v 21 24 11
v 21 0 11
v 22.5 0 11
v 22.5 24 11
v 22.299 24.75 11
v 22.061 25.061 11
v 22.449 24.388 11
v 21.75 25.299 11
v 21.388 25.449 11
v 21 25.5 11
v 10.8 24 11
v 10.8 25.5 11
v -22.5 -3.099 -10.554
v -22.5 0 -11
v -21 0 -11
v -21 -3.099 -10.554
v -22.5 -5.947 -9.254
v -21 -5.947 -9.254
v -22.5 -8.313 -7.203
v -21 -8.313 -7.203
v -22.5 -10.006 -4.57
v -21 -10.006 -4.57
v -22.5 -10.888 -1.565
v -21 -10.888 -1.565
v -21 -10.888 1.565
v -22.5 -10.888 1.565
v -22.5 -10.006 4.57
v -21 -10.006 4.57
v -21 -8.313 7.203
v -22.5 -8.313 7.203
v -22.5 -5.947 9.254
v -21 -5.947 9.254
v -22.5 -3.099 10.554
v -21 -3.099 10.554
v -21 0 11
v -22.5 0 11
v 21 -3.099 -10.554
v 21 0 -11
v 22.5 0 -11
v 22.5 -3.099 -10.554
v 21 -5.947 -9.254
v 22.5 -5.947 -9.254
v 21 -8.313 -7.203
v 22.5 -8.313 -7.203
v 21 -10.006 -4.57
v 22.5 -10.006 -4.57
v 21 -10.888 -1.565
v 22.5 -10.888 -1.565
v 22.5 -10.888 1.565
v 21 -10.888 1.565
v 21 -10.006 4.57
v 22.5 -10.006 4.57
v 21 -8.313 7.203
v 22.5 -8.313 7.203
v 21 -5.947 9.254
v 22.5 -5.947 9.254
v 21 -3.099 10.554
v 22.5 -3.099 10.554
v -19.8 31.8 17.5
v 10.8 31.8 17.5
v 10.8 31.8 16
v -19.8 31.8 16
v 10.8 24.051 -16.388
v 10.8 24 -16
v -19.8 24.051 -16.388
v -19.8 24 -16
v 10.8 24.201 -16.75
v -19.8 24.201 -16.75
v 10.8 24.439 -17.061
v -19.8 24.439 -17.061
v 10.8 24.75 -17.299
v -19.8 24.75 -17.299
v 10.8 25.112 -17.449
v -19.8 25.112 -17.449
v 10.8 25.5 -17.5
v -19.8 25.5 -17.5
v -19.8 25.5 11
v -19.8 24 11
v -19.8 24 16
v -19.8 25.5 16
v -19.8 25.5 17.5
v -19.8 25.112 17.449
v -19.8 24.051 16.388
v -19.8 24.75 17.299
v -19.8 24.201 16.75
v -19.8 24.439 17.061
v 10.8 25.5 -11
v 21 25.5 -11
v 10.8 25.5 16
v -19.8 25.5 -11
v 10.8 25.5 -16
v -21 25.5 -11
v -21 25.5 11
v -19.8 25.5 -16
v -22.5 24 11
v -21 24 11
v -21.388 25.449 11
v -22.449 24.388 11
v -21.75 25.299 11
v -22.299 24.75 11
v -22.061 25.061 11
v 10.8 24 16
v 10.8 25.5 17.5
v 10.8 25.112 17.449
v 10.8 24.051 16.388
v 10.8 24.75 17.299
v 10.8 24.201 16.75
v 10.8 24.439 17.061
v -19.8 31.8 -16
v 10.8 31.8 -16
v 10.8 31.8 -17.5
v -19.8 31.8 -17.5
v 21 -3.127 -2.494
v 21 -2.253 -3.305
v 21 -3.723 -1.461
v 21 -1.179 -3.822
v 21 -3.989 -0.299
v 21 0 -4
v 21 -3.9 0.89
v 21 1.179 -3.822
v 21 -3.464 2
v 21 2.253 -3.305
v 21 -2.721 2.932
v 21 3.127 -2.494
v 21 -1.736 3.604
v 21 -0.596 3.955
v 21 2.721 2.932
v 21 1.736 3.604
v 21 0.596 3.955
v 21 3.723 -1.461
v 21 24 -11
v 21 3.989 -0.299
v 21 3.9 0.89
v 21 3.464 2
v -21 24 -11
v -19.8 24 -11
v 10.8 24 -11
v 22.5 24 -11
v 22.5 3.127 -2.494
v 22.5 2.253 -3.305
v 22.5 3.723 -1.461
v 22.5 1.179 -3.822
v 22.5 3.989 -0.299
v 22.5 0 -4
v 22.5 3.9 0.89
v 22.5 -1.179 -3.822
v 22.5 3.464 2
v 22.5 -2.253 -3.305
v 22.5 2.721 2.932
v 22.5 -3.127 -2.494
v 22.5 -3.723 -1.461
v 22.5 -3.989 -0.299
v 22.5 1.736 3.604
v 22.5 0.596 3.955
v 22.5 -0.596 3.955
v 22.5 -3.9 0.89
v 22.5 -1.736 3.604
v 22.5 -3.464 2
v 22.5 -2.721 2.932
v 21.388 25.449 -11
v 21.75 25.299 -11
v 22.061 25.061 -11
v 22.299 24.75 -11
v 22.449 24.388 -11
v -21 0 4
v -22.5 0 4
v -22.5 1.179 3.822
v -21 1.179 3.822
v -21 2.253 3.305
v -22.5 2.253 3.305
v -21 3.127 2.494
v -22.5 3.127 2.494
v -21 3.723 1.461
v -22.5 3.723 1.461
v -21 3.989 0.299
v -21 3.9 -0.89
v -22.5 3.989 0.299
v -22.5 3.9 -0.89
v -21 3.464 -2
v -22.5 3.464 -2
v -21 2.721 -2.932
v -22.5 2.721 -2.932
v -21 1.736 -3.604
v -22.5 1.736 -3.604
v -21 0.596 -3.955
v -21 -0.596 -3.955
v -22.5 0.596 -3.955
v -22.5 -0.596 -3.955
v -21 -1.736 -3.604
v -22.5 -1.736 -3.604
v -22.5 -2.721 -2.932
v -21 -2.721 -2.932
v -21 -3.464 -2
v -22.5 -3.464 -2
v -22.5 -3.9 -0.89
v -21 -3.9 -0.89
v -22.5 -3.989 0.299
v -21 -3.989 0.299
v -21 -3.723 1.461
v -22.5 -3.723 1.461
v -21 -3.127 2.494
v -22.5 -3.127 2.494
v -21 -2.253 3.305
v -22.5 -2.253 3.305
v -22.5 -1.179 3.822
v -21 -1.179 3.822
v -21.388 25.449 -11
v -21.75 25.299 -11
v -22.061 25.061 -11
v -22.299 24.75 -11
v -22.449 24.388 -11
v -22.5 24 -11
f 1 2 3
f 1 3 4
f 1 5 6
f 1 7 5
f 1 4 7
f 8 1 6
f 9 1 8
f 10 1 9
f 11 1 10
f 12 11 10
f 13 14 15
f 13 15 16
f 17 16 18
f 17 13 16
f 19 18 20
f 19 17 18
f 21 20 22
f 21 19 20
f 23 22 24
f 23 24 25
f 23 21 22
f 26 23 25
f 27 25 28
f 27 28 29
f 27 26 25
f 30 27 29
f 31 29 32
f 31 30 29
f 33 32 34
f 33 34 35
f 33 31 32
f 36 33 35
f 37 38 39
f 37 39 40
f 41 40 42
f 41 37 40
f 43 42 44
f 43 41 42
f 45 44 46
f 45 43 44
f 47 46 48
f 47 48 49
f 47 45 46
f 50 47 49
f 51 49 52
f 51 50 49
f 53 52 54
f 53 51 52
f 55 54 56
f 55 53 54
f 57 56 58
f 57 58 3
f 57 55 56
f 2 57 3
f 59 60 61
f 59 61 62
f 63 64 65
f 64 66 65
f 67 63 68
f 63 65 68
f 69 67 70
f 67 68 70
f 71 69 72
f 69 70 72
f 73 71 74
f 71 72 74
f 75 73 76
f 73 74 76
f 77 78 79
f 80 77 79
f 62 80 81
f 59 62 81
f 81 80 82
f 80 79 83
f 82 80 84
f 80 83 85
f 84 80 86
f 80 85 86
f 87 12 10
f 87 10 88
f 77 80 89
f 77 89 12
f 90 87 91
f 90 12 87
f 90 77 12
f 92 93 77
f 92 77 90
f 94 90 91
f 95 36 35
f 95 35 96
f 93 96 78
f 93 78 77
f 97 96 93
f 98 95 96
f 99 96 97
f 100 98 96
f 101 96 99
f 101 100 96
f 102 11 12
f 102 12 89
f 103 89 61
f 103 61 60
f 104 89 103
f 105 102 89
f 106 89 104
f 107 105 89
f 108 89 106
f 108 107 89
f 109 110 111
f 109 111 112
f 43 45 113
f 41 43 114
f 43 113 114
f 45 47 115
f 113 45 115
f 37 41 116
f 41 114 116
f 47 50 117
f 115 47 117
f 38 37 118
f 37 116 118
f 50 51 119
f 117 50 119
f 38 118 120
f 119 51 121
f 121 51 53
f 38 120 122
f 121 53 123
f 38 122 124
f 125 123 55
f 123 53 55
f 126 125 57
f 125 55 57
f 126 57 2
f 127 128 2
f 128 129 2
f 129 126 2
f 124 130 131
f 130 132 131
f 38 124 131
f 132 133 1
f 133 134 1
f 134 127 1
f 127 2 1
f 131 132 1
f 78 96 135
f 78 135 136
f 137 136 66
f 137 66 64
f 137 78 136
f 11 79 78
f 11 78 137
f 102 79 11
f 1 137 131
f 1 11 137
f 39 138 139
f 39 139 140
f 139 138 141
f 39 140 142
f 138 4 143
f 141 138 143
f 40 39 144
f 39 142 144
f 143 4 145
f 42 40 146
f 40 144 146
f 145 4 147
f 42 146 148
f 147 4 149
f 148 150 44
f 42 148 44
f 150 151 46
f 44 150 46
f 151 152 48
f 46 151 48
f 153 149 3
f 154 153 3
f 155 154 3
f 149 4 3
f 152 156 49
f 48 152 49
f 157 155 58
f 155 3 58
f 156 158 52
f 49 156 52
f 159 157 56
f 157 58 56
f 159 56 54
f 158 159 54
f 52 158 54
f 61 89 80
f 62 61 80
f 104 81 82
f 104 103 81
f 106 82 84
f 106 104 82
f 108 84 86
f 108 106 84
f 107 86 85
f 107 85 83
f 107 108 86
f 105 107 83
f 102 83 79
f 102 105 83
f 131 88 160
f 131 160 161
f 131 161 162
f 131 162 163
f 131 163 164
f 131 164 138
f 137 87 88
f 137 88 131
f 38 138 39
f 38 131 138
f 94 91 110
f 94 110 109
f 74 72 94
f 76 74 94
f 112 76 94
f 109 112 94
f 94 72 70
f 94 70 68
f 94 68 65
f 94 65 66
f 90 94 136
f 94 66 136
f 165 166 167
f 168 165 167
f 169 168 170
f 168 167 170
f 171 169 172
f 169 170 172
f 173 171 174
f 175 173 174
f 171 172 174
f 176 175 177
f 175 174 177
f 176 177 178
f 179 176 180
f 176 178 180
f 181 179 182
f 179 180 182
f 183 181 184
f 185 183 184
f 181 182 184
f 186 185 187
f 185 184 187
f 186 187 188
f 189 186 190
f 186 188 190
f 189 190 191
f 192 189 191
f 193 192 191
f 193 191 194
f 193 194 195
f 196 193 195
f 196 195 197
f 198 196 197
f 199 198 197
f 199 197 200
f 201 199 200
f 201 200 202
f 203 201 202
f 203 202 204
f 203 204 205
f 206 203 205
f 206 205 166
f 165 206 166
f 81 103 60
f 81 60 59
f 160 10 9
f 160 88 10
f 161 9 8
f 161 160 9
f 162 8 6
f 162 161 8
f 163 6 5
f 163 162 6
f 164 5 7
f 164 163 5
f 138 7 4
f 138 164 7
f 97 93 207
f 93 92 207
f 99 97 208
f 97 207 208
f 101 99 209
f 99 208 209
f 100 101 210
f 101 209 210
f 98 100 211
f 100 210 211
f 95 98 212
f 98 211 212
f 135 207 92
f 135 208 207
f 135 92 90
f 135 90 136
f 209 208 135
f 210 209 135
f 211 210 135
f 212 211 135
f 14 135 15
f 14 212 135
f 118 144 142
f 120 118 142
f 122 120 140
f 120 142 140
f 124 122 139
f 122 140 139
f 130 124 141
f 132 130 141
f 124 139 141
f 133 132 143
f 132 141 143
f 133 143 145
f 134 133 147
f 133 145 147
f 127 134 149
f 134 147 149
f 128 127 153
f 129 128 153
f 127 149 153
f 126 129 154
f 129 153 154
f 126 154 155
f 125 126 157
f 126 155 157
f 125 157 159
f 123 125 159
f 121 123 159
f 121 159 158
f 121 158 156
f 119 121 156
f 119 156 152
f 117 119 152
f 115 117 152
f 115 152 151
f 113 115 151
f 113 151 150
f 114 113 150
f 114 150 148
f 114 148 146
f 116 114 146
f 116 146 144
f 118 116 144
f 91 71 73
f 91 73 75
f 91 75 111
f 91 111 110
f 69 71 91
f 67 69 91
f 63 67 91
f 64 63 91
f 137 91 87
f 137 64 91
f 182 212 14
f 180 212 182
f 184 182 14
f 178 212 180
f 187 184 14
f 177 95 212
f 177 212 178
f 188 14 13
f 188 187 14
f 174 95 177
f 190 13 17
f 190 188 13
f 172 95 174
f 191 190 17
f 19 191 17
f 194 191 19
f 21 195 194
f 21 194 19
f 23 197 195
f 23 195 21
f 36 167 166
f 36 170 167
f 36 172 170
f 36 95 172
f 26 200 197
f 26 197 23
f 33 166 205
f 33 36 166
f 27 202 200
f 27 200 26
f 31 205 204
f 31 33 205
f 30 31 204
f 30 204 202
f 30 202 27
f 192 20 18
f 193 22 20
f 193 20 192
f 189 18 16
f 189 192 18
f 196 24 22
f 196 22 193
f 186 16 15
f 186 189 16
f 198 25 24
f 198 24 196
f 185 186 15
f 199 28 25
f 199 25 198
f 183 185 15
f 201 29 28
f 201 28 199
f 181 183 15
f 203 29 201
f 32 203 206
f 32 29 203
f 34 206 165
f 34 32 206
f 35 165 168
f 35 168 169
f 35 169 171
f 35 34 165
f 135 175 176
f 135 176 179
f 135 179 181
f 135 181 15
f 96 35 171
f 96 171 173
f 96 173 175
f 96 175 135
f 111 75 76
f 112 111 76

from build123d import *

# Parameters (mm, degrees)
BOSS_EXTRUDE1_DEPTH          = 45
SKETCH2_W                    = 42
SKETCH2_H                    = 41.882656114
CUT_EXTRUDE1_DEPTH           = 23
SKETCH3_W                    = 30.6
SKETCH3_H                    = 1.5
BOSS_EXTRUDE2_DEPTH          = 6.5
SKETCH4_W                    = 30.6
SKETCH4_H                    = 1.5
BOSS_EXTRUDE3_DEPTH          = 6.3
SKETCH5_W                    = 30.6
SKETCH5_H                    = 1.5
BOSS_EXTRUDE4_DEPTH          = 6.5
SKETCH6_W                    = 30.6
SKETCH6_H                    = 1.5
BOSS_EXTRUDE5_DEPTH          = 6.3
F_8_0_8_DIAMETER_HOLE1_D     = 8
F_8_0_8_DIAMETER_HOLE1_DEPTH = 1.5
F_8_0_8_DIAMETER_HOLE2_D     = 8
F_8_0_8_DIAMETER_HOLE2_DEPTH = 1.5
FILLET1_R                    = 1.5


with BuildPart() as part:
    # Sketch1 → Boss-Extrude1 (new body)
    with BuildSketch(Plane(origin=(-22.5, 0, 0), x_dir=(0, -1, 0), z_dir=(-1, 0, 0))):
        with BuildLine():
            Line((-25.5, -11), (0, -11))
            ThreePointArc((0, -11), (11, 0), (0, 11))
            Line((0, 11), (-25.5, 11))
            Line((-25.5, 11), (-25.5, -11))
        make_face()
    extrude(amount=-BOSS_EXTRUDE1_DEPTH)

    # Sketch2 → Cut-Extrude1 (cut, through all)
    with BuildSketch(Plane.XY.offset(11)):
        with Locations((0, 3.058671943)):
            Rectangle(SKETCH2_W, SKETCH2_H)
    extrude(amount=-CUT_EXTRUDE1_DEPTH, mode=Mode.SUBTRACT)

    # Sketch3 → Boss-Extrude2 (add)
    with BuildSketch(Plane(origin=(0, 0, -11), x_dir=(-1, 0, 0), z_dir=(0, 0, -1))):
        with Locations((4.5, 24.75)):
            Rectangle(SKETCH3_W, SKETCH3_H)
    extrude(amount=BOSS_EXTRUDE2_DEPTH)

    # Sketch4 → Boss-Extrude3 (add)
    with BuildSketch(Plane(origin=(0, 25.5, 0), x_dir=(-1, 0, 0), z_dir=(0, 1, 0))):
        with Locations((4.5, -16.75)):
            Rectangle(SKETCH4_W, SKETCH4_H)
    extrude(amount=BOSS_EXTRUDE3_DEPTH)

    # Sketch5 → Boss-Extrude4 (add)
    with BuildSketch(Plane.XY.offset(11)):
        with Locations((-4.5, 24.75)):
            Rectangle(SKETCH5_W, SKETCH5_H)
    extrude(amount=BOSS_EXTRUDE4_DEPTH)

    # Sketch6 → Boss-Extrude5 (add)
    with BuildSketch(Plane(origin=(0, 25.5, 0), x_dir=(-1, 0, 0), z_dir=(0, 1, 0))):
        with Locations((4.5, 16.75)):
            Rectangle(SKETCH6_W, SKETCH6_H)
    extrude(amount=BOSS_EXTRUDE5_DEPTH)

    # Ø8.0 (8) Diameter Hole1
    with Locations(Plane.ZY.offset(-21)):
        with Locations((0, 0)):
            Hole(F_8_0_8_DIAMETER_HOLE1_D / 2, depth=F_8_0_8_DIAMETER_HOLE1_DEPTH)

    # Ø8.0 (8) Diameter Hole2
    with Locations(Plane(origin=(-21, 0, 0), x_dir=(0, 0, -1), z_dir=(1, 0, 0))):
        with Locations((0, 0)):
            Hole(F_8_0_8_DIAMETER_HOLE2_D / 2, depth=F_8_0_8_DIAMETER_HOLE2_DEPTH)

    # Fillet1
    fillet1_edges = [part.edges().sort_by_distance(p)[0] for p in [
        (-4.5, 24, -17.5),
        (22.5, 25.5, 0),
        (-22.5, 25.5, 0),
        (-4.5, 24, 17.5),
    ]]
    fillet(fillet1_edges, radius=FILLET1_R)


solid = part.part
